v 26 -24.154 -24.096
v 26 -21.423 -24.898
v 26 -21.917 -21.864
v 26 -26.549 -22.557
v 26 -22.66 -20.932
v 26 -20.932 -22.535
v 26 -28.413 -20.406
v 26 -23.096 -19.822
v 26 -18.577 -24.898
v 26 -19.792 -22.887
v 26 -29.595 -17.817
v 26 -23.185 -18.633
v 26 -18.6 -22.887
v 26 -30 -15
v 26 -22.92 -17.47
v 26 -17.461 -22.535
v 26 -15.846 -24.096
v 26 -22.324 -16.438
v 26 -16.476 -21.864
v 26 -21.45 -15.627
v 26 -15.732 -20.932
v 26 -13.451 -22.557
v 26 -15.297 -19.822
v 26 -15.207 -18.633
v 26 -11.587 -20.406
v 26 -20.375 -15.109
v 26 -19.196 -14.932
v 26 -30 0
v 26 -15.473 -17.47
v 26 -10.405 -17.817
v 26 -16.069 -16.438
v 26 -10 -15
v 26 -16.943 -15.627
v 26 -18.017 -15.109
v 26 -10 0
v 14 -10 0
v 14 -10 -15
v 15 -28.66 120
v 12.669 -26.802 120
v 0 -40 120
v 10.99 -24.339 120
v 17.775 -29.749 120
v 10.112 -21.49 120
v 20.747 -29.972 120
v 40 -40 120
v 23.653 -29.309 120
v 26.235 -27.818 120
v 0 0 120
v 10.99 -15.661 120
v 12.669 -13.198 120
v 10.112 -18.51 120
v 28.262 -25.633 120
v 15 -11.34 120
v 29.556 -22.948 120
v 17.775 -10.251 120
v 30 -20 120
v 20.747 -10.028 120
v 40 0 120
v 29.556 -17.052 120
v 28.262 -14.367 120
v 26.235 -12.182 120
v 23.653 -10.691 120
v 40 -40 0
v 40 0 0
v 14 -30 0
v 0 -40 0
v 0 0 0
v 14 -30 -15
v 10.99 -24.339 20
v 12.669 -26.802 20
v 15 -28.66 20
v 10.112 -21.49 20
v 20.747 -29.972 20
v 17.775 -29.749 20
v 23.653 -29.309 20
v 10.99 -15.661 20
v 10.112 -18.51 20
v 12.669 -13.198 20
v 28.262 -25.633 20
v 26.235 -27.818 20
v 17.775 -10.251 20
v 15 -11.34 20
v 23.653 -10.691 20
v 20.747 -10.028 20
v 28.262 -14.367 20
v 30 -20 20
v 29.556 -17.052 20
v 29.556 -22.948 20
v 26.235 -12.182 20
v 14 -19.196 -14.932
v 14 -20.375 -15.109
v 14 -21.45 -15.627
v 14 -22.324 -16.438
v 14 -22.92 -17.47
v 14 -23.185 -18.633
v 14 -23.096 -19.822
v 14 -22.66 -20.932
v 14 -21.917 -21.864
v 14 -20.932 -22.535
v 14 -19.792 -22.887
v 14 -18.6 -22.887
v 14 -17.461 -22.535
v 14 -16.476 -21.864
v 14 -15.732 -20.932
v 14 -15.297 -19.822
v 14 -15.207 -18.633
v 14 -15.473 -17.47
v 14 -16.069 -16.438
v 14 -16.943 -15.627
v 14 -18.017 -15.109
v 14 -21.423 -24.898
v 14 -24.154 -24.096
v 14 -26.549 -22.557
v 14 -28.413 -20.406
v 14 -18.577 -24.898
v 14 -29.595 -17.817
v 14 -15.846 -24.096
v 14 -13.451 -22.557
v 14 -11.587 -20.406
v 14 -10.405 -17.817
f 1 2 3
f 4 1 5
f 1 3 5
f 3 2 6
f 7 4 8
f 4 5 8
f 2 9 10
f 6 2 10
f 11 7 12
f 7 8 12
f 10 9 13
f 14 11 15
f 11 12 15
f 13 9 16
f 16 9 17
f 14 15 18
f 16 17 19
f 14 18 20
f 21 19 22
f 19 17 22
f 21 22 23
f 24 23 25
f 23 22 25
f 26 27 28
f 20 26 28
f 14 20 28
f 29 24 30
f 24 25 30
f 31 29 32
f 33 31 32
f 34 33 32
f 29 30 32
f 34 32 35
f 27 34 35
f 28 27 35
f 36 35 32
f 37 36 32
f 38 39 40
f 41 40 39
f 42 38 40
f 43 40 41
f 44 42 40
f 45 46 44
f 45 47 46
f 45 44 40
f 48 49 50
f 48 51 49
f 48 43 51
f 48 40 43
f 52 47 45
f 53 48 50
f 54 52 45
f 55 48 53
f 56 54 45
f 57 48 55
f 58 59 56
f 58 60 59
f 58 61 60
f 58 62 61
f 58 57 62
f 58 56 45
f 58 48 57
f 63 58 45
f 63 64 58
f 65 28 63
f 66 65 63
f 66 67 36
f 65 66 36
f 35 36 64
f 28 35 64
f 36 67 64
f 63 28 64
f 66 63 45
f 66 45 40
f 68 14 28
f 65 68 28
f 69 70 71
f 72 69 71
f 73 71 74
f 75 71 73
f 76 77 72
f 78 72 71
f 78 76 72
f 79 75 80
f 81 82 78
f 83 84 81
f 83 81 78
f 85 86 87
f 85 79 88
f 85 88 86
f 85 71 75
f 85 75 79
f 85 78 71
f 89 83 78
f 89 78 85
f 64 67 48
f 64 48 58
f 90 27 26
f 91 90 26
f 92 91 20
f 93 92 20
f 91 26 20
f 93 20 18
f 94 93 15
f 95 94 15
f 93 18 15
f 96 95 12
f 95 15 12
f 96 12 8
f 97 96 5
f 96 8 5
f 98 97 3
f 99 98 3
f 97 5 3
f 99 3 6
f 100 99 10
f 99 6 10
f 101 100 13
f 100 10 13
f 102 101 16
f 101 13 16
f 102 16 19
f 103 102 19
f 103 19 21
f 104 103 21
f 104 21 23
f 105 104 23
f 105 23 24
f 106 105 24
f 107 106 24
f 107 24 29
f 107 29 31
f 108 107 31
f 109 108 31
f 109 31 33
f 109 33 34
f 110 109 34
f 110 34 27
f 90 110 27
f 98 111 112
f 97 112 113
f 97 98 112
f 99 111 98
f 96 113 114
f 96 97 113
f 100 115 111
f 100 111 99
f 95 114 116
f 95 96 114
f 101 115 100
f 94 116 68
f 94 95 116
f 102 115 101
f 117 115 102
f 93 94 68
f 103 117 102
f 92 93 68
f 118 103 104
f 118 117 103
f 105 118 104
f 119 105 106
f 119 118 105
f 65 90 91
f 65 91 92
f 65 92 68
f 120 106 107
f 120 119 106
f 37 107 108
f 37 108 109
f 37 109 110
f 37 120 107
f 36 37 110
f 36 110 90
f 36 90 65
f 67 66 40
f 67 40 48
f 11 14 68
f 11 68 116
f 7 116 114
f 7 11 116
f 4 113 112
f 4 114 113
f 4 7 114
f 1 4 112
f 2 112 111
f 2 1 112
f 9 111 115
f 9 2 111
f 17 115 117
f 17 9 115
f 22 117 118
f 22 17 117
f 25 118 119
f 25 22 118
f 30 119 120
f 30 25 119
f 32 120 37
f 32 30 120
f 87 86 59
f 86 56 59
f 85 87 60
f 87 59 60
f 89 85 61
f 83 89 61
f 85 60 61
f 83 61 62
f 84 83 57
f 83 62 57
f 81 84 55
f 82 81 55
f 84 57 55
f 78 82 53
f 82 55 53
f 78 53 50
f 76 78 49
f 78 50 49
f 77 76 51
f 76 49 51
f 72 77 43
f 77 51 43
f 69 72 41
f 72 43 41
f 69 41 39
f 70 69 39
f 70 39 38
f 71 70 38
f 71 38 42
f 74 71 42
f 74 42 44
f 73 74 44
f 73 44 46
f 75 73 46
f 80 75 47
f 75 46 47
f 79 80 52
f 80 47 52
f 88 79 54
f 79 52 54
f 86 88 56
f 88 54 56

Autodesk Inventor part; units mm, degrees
ref_plane "YZ Plane" through (0, 0, 0) normal (1, 0, 0) x (0, 1, 0)
ref_plane "XZ Plane" through (0, 0, 0) normal (0, 1, 0) x (-1, 0, 0)
ref_plane "XY Plane" through (0, 0, 0) normal (0, 0, 1) x (1, 0, 0)
sketch "Boceto1" plane through (0, 0, 0) normal (0, 0, 1) x (1, 0, 0)
  line L0 (0, 0) -> (40, 0)
  line L1 (40, 0) -> (40, -40)
  line L2 (40, -40) -> (0, -40)
  line L3 (0, -40) -> (0, 0)
  dimension "d0" = 40
  dimension "d1" = 40
extrude "Extrusión1" add sketch "Boceto1" along normal blind 120
sketch "Boceto2" plane through (0, 0, 120) normal (0, 0, 1) x (1, 0, 0)
  circle A0 centre (20, -20) radius 10
  line L0 (0, 0) -> (0, -40) projected
  line L1 (40, 0) -> (0, 0) projected
  dimension "d4" = 20
  dimension "d5" = 20
  dimension "d6" = 20
extrude "Extrusión2" cut sketch "Boceto2" against normal blind 100
ref_plane "Plano de trabajo1" through (20, -40, 0) normal (-1, 0, 0) x (0, 0, 1)
sketch "Boceto5" plane through (20, -40, 0) normal (-1, 0, 0) x (0, 0, 1)
  line L0 (0, 0) -> (0, 40) projected
  line L1 (0, 30) -> (-15, 30)
  line L2 (-15, 30) -> (-15, 10)
  line L3 (-15, 10) -> (0, 10)
  line L4 (0, 10) -> (0, 30)
  line L5 (0, 40) -> (120, 40) projected
  circle A0 centre (-15, 20) radius 10
  dimension "d10" = 15
  dimension "d11" = 20
  dimension "d12" = 30
extrude "Extrusión3" add sketch "Boceto5" along normal mid plane 12
hole "Agujero1" at (14, -19.1963, -18.9315) direction (1, 0, 0) diameter 8 end through all
properties part number "cilindro sierra"
